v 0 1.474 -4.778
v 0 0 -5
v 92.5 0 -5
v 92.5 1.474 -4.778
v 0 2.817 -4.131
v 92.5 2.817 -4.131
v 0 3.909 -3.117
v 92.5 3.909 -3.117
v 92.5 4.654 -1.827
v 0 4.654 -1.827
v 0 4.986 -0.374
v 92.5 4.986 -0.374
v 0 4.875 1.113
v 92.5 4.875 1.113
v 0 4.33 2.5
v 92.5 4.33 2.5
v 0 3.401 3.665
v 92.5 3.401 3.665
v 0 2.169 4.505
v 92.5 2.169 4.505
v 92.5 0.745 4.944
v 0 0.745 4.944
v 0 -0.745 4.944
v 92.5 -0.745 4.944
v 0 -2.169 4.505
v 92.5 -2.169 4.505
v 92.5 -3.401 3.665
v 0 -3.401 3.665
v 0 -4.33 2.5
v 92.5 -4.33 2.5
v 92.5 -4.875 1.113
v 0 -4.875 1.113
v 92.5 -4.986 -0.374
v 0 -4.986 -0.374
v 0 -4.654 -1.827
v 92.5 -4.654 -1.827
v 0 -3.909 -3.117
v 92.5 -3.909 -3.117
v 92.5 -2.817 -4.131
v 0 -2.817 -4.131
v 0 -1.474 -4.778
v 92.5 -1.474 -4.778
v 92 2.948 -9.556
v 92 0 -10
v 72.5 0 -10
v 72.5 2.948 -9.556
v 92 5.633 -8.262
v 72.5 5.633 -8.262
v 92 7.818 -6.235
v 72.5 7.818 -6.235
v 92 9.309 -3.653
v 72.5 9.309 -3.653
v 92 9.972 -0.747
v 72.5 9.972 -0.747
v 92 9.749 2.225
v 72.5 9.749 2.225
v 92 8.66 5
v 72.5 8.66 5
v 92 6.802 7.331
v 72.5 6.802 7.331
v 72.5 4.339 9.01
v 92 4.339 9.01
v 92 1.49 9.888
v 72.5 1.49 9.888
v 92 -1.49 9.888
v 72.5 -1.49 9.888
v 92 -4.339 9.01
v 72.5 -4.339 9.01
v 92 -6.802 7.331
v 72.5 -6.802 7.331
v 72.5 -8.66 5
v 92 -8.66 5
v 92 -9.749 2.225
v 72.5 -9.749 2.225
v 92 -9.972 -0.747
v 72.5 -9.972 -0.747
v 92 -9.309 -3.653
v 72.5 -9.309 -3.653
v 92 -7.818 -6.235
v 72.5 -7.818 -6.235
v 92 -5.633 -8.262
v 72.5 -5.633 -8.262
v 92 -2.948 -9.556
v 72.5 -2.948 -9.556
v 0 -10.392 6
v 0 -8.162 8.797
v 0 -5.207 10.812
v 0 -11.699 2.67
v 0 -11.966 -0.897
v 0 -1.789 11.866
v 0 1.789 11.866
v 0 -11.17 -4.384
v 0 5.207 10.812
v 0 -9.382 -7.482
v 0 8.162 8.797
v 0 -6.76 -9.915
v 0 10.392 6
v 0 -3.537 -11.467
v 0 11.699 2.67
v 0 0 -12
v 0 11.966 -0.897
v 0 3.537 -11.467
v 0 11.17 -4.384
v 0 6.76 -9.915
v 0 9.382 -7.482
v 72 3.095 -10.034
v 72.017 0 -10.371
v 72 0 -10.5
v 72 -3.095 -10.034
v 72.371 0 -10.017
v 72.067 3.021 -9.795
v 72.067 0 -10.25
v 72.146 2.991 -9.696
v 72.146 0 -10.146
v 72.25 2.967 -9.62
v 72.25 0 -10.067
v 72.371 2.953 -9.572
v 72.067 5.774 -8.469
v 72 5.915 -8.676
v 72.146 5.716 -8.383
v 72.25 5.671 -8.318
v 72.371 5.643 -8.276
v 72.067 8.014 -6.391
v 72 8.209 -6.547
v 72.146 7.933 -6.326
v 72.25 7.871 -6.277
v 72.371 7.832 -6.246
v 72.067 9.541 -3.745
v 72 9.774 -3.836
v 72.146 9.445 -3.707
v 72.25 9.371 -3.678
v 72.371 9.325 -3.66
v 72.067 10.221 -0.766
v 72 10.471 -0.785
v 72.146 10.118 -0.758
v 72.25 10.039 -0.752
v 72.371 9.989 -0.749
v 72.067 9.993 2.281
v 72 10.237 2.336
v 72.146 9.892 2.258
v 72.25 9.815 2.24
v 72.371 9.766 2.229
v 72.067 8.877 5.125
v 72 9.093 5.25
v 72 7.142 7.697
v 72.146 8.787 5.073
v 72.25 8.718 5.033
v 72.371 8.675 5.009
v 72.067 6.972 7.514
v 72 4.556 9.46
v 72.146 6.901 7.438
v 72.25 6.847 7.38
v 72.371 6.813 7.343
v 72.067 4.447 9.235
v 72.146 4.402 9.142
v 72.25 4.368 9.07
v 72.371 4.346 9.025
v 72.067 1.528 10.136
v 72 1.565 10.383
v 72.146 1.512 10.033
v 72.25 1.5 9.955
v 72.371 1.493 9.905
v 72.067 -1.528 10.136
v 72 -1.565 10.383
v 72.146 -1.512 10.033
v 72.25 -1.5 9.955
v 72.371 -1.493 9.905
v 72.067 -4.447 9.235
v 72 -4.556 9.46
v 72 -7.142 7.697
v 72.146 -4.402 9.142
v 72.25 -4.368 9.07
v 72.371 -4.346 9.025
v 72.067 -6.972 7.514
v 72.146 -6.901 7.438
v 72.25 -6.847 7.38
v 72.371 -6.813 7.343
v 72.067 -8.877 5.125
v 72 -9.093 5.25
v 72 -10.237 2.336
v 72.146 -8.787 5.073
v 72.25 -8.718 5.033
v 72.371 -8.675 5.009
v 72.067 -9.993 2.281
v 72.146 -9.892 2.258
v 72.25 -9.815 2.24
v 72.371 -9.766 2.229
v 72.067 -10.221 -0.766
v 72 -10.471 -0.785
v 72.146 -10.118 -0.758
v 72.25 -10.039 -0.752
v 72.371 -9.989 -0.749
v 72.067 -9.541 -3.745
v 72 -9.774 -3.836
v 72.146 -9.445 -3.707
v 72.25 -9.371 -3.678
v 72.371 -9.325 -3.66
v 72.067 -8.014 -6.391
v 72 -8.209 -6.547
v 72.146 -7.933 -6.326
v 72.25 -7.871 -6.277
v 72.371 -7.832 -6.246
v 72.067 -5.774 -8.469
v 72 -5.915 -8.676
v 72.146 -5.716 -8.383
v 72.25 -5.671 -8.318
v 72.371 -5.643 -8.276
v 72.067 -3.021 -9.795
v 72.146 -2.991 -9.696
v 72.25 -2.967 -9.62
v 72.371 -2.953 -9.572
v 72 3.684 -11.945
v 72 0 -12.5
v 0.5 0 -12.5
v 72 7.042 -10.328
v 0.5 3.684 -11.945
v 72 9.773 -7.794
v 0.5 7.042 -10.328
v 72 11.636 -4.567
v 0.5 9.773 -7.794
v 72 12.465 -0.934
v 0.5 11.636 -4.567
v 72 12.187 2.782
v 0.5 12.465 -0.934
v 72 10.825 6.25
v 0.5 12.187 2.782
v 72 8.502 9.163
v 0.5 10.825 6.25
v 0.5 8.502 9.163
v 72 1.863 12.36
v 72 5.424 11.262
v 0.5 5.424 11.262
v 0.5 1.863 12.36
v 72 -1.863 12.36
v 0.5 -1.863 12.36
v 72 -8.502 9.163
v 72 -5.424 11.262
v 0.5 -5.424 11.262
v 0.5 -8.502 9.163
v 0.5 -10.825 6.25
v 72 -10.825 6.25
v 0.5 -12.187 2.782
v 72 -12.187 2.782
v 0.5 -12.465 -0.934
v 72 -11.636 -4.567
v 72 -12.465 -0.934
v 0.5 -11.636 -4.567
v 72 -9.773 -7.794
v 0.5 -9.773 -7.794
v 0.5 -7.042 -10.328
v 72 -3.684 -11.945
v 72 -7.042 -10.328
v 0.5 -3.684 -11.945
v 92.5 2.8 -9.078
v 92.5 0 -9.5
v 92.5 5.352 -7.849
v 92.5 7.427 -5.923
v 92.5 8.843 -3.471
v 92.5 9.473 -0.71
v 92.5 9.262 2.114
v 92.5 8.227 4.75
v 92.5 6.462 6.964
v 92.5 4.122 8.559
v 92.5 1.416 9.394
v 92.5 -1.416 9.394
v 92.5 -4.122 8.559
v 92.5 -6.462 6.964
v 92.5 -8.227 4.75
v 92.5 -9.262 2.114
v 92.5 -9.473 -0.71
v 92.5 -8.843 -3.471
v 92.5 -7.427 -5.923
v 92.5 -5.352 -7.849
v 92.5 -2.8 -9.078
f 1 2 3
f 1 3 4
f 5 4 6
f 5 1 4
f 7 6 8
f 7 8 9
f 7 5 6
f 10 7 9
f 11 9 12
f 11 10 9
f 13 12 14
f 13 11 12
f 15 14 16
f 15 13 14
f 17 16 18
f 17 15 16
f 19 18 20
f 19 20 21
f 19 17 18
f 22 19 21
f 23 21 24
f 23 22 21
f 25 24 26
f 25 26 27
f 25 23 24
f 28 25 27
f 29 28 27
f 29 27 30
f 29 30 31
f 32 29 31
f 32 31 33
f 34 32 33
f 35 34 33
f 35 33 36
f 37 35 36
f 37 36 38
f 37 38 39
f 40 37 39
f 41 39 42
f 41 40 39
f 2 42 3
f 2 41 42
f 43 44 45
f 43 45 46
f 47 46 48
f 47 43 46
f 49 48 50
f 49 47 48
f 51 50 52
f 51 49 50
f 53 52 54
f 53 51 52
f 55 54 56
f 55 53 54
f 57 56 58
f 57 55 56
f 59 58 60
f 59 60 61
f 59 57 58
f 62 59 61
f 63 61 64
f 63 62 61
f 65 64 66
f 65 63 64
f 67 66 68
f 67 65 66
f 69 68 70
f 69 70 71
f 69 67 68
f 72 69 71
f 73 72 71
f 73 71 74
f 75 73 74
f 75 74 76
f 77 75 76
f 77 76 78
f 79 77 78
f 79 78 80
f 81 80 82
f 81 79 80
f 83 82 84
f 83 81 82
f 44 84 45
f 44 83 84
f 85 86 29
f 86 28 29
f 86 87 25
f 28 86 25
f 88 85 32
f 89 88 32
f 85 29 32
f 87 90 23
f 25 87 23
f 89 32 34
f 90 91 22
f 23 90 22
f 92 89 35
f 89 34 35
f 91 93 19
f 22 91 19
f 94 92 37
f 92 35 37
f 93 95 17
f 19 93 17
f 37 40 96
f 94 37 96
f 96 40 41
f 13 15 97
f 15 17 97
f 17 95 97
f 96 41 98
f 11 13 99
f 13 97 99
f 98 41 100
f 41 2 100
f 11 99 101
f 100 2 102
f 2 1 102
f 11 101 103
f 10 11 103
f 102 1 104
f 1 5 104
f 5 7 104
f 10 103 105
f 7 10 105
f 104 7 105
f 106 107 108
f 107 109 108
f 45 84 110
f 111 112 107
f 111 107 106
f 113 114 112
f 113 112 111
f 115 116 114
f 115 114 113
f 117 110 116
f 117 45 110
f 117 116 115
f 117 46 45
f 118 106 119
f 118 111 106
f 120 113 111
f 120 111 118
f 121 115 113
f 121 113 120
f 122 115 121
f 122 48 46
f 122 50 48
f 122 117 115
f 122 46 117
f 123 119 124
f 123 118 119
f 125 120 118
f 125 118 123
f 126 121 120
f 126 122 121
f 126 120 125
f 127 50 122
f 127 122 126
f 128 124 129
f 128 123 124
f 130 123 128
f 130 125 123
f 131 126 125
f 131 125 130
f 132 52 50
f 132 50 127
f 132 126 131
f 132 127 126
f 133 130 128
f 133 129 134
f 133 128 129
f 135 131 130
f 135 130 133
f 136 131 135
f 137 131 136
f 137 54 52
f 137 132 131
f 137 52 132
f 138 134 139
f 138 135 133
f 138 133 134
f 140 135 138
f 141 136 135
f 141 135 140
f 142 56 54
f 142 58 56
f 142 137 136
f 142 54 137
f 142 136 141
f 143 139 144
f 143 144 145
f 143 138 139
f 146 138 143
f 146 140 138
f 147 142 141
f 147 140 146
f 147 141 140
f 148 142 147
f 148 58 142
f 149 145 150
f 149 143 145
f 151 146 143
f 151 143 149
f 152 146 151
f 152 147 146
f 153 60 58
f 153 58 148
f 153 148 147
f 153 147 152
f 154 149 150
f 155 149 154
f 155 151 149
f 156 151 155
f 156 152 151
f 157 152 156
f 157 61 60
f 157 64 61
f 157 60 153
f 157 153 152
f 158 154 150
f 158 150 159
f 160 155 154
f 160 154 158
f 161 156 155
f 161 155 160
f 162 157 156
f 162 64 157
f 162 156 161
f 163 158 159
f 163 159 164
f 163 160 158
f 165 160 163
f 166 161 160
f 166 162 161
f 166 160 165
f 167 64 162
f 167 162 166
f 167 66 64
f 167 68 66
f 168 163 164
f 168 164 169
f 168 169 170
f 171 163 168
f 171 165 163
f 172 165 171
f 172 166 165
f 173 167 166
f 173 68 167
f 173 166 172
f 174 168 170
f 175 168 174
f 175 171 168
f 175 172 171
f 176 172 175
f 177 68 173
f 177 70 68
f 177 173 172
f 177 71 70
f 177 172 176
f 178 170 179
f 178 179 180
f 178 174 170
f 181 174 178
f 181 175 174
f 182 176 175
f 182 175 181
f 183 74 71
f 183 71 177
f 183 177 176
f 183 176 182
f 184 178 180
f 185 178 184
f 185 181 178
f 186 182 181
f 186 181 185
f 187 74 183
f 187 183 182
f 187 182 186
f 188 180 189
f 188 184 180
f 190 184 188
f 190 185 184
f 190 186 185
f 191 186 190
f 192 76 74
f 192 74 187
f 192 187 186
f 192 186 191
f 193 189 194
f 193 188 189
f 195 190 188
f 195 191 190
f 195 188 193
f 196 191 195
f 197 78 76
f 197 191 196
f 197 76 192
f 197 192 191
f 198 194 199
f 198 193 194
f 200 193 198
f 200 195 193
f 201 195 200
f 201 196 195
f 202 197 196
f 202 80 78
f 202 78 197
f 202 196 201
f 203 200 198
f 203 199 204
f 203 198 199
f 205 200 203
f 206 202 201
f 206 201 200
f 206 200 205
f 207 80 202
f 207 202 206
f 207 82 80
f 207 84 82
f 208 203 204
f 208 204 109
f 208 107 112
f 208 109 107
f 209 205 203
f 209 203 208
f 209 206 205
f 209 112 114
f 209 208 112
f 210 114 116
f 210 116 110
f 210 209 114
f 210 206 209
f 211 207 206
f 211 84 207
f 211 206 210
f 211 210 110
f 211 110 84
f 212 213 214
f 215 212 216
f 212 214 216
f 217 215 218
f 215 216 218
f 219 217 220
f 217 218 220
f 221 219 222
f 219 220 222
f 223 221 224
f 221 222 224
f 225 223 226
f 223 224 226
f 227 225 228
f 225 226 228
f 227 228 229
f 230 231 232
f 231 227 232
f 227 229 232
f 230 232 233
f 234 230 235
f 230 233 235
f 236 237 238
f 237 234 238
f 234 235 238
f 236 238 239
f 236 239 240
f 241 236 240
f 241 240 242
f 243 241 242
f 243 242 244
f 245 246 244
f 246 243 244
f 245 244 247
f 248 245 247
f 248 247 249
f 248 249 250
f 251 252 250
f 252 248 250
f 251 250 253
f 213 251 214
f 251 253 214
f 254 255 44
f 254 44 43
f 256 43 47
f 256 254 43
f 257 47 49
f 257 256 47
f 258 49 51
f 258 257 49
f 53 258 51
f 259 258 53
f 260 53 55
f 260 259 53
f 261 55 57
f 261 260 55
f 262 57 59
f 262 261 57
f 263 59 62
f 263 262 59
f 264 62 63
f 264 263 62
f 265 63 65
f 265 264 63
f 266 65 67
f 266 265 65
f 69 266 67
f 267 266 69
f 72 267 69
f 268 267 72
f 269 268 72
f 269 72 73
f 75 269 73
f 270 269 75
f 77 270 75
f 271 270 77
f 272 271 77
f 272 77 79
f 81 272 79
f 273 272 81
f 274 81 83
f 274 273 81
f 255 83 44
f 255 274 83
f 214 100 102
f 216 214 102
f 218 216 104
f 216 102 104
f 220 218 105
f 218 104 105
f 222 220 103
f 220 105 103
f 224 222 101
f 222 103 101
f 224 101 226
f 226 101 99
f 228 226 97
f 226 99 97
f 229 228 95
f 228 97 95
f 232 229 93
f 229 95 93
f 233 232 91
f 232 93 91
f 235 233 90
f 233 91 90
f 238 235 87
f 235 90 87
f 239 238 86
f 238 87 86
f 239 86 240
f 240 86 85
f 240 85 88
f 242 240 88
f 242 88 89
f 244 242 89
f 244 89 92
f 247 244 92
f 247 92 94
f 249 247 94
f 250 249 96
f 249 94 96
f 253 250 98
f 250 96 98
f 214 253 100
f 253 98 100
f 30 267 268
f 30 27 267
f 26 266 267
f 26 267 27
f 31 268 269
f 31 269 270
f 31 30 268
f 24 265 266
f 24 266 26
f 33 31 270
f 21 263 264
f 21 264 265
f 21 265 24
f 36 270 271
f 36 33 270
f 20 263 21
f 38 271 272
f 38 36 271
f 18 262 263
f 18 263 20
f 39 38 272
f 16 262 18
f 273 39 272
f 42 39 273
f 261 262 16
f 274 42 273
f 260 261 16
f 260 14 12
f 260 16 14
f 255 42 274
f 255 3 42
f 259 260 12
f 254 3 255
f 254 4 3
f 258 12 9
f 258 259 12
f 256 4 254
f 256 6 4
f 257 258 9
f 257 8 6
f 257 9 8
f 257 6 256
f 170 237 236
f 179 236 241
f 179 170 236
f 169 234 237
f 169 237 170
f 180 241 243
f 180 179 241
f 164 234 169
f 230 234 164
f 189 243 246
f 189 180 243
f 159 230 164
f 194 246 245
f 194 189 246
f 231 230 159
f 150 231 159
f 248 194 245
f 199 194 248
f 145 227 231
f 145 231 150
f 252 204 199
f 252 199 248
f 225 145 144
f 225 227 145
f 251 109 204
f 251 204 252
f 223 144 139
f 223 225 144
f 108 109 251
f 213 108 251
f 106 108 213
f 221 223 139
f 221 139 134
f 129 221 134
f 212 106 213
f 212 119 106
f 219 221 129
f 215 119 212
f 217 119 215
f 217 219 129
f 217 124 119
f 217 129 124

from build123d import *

# Parameters (mm, degrees)
SKETCH1_R           = 12.5
SKETCH1_R_2         = 5
BOSS_EXTRUDE1_DEPTH = 92.5
SKETCH2_OUTSIDE_W   = 46.806
SKETCH2_OUTSIDE_H   = 46.806
SKETCH2_OUTSIDE_R   = 10
CUT_EXTRUDE1_DEPTH  = 20.5
FILLET1_R           = 0.5
CHAMFER1_SIZE       = 0.5


with BuildPart() as part:
    # Sketch1 → Boss-Extrude1 (new body)
    with BuildSketch(Plane(origin=(0, 0, 0), x_dir=(0, 0, -1), z_dir=(1, 0, 0))):
        Circle(SKETCH1_R)
        Circle(SKETCH1_R_2, mode=Mode.SUBTRACT)
    extrude(amount=BOSS_EXTRUDE1_DEPTH)

    # Sketch2 outside → Cut-Extrude1 (cut)
    with BuildSketch(Plane(origin=(92.5, 0, 0), x_dir=(0, 0, -1), z_dir=(1, 0, 0))):
        Rectangle(SKETCH2_OUTSIDE_W, SKETCH2_OUTSIDE_H)
        Circle(SKETCH2_OUTSIDE_R, mode=Mode.SUBTRACT)
    extrude(amount=-CUT_EXTRUDE1_DEPTH, mode=Mode.SUBTRACT)

    # Fillet1
    fillet1_edges = [part.edges().sort_by_distance(p)[0] for p in [
        (72, 0, 10),
    ]]
    fillet(fillet1_edges, radius=FILLET1_R)

    # Chamfer1
    chamfer1_edges = [part.edges().sort_by_distance(p)[0] for p in [
        (92.5, 0, 10),
        (0, 0, 12.5),
    ]]
    chamfer(chamfer1_edges, length=CHAMFER1_SIZE)


solid = part.part
